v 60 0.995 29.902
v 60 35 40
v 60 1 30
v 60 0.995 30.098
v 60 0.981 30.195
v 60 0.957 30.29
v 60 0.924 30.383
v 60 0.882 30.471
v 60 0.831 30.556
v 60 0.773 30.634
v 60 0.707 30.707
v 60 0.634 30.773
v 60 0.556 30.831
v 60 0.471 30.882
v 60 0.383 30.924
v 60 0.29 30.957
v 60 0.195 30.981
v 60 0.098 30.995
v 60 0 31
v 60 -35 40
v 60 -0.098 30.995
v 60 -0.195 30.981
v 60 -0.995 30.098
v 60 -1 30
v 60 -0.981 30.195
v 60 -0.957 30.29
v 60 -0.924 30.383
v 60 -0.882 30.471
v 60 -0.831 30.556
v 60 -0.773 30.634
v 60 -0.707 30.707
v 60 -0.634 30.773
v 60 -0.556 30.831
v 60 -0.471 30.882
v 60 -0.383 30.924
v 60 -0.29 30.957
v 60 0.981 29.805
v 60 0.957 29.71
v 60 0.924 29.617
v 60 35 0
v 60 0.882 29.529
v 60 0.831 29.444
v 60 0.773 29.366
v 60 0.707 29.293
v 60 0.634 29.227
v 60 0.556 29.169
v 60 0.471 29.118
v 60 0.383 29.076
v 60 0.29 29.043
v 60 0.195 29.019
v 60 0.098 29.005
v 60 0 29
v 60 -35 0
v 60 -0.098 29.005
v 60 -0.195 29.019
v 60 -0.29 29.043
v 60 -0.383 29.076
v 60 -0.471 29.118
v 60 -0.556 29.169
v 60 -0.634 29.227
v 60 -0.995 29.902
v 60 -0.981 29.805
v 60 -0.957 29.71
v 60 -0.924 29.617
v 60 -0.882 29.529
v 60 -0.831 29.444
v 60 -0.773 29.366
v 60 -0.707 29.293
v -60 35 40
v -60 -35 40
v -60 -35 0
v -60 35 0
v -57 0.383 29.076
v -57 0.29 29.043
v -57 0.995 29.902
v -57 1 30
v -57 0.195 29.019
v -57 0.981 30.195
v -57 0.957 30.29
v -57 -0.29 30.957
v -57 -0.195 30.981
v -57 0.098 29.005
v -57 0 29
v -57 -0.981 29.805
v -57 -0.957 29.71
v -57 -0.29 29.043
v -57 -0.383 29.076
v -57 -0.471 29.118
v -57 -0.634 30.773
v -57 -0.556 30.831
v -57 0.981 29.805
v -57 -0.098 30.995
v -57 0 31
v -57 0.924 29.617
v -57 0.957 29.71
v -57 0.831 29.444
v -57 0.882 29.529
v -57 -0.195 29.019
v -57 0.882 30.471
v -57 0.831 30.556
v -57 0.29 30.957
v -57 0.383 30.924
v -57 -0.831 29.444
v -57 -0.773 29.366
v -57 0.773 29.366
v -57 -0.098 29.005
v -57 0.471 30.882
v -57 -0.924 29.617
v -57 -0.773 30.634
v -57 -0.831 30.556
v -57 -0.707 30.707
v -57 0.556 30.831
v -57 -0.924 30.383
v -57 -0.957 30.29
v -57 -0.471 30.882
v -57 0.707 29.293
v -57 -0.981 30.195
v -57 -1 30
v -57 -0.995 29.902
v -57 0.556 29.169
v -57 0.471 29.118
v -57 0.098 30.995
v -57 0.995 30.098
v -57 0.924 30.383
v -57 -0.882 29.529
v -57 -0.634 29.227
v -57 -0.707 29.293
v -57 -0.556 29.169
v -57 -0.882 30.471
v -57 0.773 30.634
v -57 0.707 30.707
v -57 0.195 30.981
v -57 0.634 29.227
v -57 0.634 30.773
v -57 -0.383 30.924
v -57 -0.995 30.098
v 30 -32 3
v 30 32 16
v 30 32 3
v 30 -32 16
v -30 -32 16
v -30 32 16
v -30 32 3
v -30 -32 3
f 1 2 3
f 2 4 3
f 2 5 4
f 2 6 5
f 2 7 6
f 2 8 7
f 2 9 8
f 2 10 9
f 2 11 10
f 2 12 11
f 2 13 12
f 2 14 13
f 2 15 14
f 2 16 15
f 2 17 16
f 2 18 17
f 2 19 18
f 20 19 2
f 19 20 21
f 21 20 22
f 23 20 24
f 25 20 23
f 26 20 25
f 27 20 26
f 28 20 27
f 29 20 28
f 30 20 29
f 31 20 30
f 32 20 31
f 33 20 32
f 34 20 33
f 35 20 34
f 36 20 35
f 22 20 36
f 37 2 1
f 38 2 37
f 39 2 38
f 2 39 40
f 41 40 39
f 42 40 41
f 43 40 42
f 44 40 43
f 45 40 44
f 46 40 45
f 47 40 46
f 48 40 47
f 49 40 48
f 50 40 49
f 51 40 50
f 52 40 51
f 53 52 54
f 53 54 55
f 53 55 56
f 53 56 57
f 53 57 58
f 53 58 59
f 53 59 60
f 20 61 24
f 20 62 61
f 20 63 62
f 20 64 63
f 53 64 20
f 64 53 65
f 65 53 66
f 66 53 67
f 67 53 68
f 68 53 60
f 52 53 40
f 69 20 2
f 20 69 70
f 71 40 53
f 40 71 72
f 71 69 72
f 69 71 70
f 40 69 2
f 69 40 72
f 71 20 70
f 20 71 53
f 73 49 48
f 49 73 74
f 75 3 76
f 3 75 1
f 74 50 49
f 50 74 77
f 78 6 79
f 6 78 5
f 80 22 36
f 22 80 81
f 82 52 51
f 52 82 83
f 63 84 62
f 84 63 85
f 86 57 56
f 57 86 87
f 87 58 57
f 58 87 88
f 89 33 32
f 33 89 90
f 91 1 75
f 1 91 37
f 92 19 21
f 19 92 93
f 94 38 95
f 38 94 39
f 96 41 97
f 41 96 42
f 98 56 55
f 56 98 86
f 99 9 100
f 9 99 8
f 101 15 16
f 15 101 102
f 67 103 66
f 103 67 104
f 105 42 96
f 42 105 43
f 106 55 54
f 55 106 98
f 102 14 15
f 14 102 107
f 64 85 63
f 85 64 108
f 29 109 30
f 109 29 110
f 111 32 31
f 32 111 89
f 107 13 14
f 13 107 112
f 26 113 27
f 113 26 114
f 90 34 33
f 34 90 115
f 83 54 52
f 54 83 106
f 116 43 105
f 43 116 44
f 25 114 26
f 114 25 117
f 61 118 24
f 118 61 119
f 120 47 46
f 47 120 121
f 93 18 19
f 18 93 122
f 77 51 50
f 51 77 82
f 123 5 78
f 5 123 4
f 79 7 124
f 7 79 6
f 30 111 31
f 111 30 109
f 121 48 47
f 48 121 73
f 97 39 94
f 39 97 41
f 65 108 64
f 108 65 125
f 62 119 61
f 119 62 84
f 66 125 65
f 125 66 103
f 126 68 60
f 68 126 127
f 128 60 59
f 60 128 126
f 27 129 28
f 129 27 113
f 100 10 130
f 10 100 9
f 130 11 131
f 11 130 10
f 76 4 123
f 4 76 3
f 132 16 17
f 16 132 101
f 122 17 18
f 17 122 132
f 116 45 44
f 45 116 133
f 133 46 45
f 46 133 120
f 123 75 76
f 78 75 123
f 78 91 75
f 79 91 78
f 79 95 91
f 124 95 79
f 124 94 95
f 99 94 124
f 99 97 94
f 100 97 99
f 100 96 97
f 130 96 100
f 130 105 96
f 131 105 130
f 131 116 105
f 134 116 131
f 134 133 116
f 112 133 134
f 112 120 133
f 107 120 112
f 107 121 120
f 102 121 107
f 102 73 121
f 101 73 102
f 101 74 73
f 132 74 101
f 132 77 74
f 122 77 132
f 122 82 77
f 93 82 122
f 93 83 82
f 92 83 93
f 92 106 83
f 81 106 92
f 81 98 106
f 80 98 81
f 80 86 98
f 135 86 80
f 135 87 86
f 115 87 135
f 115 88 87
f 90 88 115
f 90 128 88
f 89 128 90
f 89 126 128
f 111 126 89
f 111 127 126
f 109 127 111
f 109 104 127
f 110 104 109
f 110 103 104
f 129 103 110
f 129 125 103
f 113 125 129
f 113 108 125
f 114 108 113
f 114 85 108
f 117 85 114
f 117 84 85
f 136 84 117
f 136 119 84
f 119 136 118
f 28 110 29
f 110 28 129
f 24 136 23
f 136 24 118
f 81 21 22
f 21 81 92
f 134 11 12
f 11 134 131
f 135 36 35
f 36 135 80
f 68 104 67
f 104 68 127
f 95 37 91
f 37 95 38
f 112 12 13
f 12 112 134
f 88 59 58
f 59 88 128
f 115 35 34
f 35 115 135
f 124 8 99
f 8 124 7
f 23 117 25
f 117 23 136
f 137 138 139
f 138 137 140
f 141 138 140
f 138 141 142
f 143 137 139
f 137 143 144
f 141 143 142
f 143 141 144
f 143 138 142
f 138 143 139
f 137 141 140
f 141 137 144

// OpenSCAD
// Mini horizontal gel-electrophoresis buffer tank
// Print orientation: base on XY plane, open top facing +Z

// ---- Tank dimensions ----
outer_x = 120;   // outer length along X
outer_y = 70;    // outer width along Y
height  = 40;    // overall height along Z
wall    = 3;     // wall thickness
floor   = 3;     // floor thickness

// ---- Platform dimensions ----
platform_len   = 60;   // platform length along X
platform_top_z = 13;   // platform top height (10 mm above inner floor)

// ---- Wire holes ----
hole_d = 2;     // hole diameter
hole_y = 0;     // hole Y position
hole_z = 30;    // hole Z position

// ---- Derived ----
inner_x = outer_x - 2 * wall;   // 114
inner_z = height - floor;       // 37
overlap = 0.5;                  // for clean cuts

$fn = 64;

difference() {
    // Tank body
    union() {
        // Outer block
        translate([-outer_x / 2, -outer_y / 2, 0])
            cube([outer_x, outer_y, height]);
        // Inner cavity (open top)
        translate([-inner_x / 2, -outer_y / 2 + wall, floor])
            cube([inner_x, outer_y - 2 * wall, inner_z]);
    }

    // Raised platform in middle
    translate([-platform_len / 2, -outer_y / 2 + wall, floor])
        cube([platform_len, outer_y - 2 * wall, platform_top_z]);

    // Wire holes through end walls along X
    for (sx = [-1, 1])
        translate([sx > 0 ? inner_x / 2 - overlap : -inner_x / 2, hole_y, hole_z])
            rotate([0, 90, 0])
                cylinder(d = hole_d, h = outer_x + 2 * overlap);
}
